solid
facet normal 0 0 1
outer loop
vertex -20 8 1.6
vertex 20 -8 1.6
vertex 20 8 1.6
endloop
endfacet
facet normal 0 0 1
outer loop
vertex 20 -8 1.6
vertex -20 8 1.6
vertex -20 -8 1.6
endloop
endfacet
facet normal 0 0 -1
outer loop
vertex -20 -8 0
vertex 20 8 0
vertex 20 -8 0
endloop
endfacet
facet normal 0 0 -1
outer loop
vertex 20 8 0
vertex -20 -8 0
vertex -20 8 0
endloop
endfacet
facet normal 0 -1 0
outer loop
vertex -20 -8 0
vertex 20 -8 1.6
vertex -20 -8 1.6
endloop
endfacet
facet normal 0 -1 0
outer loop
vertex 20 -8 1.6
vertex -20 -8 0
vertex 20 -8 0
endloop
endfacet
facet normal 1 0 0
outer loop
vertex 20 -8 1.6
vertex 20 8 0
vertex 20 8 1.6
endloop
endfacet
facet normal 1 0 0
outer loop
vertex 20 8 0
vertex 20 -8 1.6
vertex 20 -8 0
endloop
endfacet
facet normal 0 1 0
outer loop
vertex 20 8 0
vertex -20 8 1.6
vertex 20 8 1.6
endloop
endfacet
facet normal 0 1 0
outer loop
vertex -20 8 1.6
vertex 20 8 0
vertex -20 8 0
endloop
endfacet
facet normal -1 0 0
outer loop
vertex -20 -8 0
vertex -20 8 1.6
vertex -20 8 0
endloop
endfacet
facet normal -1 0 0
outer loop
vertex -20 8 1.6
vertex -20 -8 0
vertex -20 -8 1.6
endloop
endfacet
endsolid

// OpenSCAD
$fn=64;

module pcb(length=40.0, width=16.0, thickness=1.6) {
    translate([0,0,thickness/2])
        cube([length, width, thickness], center=true);
}

pcb();
